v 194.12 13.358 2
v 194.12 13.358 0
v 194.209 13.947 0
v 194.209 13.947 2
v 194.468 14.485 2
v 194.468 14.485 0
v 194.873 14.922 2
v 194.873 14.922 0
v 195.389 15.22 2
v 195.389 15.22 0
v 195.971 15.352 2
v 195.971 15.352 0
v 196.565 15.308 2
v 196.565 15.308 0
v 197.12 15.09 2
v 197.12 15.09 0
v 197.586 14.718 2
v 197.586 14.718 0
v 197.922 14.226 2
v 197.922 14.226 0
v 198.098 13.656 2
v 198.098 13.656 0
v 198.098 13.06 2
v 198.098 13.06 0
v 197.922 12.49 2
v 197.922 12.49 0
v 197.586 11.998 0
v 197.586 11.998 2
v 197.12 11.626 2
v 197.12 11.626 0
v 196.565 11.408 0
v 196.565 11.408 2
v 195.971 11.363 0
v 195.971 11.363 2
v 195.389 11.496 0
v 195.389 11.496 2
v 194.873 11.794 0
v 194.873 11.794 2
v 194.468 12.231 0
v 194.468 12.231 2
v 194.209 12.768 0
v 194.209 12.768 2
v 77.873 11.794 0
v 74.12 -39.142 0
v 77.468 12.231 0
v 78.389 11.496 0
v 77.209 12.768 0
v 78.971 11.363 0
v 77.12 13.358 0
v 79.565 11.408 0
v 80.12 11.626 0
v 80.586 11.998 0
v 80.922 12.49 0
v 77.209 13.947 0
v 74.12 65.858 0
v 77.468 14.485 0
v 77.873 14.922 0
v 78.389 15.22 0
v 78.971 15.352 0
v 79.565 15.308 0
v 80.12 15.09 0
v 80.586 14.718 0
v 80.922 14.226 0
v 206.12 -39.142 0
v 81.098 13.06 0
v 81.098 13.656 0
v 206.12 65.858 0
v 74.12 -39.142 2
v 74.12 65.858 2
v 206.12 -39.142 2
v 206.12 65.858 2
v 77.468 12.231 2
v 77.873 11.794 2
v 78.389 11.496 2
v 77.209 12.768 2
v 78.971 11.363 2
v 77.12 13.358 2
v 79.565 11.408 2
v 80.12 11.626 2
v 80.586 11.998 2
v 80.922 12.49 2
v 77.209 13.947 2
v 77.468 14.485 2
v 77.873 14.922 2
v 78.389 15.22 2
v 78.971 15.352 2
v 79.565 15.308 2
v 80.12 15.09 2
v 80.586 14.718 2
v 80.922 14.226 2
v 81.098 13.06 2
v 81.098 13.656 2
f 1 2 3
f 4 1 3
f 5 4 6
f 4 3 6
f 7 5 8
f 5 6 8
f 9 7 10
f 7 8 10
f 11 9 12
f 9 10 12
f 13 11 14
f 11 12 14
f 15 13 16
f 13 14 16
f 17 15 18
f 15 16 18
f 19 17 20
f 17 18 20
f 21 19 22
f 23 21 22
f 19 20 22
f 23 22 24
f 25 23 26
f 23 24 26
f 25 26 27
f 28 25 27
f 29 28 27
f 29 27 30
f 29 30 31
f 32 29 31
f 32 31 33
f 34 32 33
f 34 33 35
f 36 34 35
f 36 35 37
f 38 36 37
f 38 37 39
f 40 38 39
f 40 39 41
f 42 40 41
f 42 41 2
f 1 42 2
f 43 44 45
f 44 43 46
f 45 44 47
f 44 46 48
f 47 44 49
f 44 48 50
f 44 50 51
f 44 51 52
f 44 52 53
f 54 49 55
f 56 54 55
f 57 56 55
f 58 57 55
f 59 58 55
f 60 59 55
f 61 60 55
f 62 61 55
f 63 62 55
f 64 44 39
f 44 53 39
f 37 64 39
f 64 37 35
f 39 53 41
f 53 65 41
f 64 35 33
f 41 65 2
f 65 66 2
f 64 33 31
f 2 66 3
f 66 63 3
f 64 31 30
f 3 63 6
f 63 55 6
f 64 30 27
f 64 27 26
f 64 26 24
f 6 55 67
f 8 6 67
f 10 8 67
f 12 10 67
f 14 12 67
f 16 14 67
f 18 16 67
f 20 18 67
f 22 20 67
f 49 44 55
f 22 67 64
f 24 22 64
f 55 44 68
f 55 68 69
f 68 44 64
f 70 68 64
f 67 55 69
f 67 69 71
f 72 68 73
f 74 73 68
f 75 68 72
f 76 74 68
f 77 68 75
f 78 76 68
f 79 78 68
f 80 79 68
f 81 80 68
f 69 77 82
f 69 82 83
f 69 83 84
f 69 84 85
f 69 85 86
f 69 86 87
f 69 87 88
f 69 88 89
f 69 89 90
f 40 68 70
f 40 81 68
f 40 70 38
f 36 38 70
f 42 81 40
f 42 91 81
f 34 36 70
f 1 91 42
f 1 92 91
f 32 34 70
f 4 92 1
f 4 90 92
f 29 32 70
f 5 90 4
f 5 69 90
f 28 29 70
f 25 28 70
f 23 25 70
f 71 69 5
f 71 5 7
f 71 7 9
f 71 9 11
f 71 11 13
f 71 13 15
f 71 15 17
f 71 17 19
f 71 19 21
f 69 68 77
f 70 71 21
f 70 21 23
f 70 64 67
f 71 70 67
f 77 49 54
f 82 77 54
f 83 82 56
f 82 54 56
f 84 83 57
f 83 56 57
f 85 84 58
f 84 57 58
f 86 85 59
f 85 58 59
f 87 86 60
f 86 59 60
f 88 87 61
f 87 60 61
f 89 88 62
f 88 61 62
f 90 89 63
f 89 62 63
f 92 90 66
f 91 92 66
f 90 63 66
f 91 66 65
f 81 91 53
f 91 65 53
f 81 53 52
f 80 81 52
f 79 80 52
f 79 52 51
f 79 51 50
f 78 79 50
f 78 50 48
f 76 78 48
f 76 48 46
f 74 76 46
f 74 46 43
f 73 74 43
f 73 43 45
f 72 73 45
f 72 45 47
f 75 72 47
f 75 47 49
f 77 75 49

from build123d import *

# Parameters (mm, degrees)
SKETCH1_W           = 132
SKETCH1_H           = 105
BOSS_EXTRUDE1_DEPTH = 2
SKETCH2_R           = 2
CUT_EXTRUDE1_DEPTH  = 10
SKETCH3_R           = 2
CUT_EXTRUDE2_DEPTH  = 10


with BuildPart() as part:
    # Sketch1 → Boss-Extrude1 (new body)
    with BuildSketch(Plane.XY):
        with Locations((140.120120189, 13.357893544)):
            Rectangle(SKETCH1_W, SKETCH1_H)
    extrude(amount=BOSS_EXTRUDE1_DEPTH)

    # Sketch2 → Cut-Extrude1 (cut)
    with BuildSketch(Plane(origin=(0, 0, 0), x_dir=(-1, 0, 0), z_dir=(0, 0, -1))):
        with Locations((-196.120120189, 13.357893544)):
            Circle(SKETCH2_R)
    extrude(amount=-CUT_EXTRUDE1_DEPTH, mode=Mode.SUBTRACT)

    # Sketch3 → Cut-Extrude2 (cut)
    with BuildSketch(Plane(origin=(0, 0, 0), x_dir=(-1, 0, 0), z_dir=(0, 0, -1))):
        with Locations((-79.120120189, 13.357893544)):
            Circle(SKETCH3_R)
    extrude(amount=-CUT_EXTRUDE2_DEPTH, mode=Mode.SUBTRACT)


solid = part.part
